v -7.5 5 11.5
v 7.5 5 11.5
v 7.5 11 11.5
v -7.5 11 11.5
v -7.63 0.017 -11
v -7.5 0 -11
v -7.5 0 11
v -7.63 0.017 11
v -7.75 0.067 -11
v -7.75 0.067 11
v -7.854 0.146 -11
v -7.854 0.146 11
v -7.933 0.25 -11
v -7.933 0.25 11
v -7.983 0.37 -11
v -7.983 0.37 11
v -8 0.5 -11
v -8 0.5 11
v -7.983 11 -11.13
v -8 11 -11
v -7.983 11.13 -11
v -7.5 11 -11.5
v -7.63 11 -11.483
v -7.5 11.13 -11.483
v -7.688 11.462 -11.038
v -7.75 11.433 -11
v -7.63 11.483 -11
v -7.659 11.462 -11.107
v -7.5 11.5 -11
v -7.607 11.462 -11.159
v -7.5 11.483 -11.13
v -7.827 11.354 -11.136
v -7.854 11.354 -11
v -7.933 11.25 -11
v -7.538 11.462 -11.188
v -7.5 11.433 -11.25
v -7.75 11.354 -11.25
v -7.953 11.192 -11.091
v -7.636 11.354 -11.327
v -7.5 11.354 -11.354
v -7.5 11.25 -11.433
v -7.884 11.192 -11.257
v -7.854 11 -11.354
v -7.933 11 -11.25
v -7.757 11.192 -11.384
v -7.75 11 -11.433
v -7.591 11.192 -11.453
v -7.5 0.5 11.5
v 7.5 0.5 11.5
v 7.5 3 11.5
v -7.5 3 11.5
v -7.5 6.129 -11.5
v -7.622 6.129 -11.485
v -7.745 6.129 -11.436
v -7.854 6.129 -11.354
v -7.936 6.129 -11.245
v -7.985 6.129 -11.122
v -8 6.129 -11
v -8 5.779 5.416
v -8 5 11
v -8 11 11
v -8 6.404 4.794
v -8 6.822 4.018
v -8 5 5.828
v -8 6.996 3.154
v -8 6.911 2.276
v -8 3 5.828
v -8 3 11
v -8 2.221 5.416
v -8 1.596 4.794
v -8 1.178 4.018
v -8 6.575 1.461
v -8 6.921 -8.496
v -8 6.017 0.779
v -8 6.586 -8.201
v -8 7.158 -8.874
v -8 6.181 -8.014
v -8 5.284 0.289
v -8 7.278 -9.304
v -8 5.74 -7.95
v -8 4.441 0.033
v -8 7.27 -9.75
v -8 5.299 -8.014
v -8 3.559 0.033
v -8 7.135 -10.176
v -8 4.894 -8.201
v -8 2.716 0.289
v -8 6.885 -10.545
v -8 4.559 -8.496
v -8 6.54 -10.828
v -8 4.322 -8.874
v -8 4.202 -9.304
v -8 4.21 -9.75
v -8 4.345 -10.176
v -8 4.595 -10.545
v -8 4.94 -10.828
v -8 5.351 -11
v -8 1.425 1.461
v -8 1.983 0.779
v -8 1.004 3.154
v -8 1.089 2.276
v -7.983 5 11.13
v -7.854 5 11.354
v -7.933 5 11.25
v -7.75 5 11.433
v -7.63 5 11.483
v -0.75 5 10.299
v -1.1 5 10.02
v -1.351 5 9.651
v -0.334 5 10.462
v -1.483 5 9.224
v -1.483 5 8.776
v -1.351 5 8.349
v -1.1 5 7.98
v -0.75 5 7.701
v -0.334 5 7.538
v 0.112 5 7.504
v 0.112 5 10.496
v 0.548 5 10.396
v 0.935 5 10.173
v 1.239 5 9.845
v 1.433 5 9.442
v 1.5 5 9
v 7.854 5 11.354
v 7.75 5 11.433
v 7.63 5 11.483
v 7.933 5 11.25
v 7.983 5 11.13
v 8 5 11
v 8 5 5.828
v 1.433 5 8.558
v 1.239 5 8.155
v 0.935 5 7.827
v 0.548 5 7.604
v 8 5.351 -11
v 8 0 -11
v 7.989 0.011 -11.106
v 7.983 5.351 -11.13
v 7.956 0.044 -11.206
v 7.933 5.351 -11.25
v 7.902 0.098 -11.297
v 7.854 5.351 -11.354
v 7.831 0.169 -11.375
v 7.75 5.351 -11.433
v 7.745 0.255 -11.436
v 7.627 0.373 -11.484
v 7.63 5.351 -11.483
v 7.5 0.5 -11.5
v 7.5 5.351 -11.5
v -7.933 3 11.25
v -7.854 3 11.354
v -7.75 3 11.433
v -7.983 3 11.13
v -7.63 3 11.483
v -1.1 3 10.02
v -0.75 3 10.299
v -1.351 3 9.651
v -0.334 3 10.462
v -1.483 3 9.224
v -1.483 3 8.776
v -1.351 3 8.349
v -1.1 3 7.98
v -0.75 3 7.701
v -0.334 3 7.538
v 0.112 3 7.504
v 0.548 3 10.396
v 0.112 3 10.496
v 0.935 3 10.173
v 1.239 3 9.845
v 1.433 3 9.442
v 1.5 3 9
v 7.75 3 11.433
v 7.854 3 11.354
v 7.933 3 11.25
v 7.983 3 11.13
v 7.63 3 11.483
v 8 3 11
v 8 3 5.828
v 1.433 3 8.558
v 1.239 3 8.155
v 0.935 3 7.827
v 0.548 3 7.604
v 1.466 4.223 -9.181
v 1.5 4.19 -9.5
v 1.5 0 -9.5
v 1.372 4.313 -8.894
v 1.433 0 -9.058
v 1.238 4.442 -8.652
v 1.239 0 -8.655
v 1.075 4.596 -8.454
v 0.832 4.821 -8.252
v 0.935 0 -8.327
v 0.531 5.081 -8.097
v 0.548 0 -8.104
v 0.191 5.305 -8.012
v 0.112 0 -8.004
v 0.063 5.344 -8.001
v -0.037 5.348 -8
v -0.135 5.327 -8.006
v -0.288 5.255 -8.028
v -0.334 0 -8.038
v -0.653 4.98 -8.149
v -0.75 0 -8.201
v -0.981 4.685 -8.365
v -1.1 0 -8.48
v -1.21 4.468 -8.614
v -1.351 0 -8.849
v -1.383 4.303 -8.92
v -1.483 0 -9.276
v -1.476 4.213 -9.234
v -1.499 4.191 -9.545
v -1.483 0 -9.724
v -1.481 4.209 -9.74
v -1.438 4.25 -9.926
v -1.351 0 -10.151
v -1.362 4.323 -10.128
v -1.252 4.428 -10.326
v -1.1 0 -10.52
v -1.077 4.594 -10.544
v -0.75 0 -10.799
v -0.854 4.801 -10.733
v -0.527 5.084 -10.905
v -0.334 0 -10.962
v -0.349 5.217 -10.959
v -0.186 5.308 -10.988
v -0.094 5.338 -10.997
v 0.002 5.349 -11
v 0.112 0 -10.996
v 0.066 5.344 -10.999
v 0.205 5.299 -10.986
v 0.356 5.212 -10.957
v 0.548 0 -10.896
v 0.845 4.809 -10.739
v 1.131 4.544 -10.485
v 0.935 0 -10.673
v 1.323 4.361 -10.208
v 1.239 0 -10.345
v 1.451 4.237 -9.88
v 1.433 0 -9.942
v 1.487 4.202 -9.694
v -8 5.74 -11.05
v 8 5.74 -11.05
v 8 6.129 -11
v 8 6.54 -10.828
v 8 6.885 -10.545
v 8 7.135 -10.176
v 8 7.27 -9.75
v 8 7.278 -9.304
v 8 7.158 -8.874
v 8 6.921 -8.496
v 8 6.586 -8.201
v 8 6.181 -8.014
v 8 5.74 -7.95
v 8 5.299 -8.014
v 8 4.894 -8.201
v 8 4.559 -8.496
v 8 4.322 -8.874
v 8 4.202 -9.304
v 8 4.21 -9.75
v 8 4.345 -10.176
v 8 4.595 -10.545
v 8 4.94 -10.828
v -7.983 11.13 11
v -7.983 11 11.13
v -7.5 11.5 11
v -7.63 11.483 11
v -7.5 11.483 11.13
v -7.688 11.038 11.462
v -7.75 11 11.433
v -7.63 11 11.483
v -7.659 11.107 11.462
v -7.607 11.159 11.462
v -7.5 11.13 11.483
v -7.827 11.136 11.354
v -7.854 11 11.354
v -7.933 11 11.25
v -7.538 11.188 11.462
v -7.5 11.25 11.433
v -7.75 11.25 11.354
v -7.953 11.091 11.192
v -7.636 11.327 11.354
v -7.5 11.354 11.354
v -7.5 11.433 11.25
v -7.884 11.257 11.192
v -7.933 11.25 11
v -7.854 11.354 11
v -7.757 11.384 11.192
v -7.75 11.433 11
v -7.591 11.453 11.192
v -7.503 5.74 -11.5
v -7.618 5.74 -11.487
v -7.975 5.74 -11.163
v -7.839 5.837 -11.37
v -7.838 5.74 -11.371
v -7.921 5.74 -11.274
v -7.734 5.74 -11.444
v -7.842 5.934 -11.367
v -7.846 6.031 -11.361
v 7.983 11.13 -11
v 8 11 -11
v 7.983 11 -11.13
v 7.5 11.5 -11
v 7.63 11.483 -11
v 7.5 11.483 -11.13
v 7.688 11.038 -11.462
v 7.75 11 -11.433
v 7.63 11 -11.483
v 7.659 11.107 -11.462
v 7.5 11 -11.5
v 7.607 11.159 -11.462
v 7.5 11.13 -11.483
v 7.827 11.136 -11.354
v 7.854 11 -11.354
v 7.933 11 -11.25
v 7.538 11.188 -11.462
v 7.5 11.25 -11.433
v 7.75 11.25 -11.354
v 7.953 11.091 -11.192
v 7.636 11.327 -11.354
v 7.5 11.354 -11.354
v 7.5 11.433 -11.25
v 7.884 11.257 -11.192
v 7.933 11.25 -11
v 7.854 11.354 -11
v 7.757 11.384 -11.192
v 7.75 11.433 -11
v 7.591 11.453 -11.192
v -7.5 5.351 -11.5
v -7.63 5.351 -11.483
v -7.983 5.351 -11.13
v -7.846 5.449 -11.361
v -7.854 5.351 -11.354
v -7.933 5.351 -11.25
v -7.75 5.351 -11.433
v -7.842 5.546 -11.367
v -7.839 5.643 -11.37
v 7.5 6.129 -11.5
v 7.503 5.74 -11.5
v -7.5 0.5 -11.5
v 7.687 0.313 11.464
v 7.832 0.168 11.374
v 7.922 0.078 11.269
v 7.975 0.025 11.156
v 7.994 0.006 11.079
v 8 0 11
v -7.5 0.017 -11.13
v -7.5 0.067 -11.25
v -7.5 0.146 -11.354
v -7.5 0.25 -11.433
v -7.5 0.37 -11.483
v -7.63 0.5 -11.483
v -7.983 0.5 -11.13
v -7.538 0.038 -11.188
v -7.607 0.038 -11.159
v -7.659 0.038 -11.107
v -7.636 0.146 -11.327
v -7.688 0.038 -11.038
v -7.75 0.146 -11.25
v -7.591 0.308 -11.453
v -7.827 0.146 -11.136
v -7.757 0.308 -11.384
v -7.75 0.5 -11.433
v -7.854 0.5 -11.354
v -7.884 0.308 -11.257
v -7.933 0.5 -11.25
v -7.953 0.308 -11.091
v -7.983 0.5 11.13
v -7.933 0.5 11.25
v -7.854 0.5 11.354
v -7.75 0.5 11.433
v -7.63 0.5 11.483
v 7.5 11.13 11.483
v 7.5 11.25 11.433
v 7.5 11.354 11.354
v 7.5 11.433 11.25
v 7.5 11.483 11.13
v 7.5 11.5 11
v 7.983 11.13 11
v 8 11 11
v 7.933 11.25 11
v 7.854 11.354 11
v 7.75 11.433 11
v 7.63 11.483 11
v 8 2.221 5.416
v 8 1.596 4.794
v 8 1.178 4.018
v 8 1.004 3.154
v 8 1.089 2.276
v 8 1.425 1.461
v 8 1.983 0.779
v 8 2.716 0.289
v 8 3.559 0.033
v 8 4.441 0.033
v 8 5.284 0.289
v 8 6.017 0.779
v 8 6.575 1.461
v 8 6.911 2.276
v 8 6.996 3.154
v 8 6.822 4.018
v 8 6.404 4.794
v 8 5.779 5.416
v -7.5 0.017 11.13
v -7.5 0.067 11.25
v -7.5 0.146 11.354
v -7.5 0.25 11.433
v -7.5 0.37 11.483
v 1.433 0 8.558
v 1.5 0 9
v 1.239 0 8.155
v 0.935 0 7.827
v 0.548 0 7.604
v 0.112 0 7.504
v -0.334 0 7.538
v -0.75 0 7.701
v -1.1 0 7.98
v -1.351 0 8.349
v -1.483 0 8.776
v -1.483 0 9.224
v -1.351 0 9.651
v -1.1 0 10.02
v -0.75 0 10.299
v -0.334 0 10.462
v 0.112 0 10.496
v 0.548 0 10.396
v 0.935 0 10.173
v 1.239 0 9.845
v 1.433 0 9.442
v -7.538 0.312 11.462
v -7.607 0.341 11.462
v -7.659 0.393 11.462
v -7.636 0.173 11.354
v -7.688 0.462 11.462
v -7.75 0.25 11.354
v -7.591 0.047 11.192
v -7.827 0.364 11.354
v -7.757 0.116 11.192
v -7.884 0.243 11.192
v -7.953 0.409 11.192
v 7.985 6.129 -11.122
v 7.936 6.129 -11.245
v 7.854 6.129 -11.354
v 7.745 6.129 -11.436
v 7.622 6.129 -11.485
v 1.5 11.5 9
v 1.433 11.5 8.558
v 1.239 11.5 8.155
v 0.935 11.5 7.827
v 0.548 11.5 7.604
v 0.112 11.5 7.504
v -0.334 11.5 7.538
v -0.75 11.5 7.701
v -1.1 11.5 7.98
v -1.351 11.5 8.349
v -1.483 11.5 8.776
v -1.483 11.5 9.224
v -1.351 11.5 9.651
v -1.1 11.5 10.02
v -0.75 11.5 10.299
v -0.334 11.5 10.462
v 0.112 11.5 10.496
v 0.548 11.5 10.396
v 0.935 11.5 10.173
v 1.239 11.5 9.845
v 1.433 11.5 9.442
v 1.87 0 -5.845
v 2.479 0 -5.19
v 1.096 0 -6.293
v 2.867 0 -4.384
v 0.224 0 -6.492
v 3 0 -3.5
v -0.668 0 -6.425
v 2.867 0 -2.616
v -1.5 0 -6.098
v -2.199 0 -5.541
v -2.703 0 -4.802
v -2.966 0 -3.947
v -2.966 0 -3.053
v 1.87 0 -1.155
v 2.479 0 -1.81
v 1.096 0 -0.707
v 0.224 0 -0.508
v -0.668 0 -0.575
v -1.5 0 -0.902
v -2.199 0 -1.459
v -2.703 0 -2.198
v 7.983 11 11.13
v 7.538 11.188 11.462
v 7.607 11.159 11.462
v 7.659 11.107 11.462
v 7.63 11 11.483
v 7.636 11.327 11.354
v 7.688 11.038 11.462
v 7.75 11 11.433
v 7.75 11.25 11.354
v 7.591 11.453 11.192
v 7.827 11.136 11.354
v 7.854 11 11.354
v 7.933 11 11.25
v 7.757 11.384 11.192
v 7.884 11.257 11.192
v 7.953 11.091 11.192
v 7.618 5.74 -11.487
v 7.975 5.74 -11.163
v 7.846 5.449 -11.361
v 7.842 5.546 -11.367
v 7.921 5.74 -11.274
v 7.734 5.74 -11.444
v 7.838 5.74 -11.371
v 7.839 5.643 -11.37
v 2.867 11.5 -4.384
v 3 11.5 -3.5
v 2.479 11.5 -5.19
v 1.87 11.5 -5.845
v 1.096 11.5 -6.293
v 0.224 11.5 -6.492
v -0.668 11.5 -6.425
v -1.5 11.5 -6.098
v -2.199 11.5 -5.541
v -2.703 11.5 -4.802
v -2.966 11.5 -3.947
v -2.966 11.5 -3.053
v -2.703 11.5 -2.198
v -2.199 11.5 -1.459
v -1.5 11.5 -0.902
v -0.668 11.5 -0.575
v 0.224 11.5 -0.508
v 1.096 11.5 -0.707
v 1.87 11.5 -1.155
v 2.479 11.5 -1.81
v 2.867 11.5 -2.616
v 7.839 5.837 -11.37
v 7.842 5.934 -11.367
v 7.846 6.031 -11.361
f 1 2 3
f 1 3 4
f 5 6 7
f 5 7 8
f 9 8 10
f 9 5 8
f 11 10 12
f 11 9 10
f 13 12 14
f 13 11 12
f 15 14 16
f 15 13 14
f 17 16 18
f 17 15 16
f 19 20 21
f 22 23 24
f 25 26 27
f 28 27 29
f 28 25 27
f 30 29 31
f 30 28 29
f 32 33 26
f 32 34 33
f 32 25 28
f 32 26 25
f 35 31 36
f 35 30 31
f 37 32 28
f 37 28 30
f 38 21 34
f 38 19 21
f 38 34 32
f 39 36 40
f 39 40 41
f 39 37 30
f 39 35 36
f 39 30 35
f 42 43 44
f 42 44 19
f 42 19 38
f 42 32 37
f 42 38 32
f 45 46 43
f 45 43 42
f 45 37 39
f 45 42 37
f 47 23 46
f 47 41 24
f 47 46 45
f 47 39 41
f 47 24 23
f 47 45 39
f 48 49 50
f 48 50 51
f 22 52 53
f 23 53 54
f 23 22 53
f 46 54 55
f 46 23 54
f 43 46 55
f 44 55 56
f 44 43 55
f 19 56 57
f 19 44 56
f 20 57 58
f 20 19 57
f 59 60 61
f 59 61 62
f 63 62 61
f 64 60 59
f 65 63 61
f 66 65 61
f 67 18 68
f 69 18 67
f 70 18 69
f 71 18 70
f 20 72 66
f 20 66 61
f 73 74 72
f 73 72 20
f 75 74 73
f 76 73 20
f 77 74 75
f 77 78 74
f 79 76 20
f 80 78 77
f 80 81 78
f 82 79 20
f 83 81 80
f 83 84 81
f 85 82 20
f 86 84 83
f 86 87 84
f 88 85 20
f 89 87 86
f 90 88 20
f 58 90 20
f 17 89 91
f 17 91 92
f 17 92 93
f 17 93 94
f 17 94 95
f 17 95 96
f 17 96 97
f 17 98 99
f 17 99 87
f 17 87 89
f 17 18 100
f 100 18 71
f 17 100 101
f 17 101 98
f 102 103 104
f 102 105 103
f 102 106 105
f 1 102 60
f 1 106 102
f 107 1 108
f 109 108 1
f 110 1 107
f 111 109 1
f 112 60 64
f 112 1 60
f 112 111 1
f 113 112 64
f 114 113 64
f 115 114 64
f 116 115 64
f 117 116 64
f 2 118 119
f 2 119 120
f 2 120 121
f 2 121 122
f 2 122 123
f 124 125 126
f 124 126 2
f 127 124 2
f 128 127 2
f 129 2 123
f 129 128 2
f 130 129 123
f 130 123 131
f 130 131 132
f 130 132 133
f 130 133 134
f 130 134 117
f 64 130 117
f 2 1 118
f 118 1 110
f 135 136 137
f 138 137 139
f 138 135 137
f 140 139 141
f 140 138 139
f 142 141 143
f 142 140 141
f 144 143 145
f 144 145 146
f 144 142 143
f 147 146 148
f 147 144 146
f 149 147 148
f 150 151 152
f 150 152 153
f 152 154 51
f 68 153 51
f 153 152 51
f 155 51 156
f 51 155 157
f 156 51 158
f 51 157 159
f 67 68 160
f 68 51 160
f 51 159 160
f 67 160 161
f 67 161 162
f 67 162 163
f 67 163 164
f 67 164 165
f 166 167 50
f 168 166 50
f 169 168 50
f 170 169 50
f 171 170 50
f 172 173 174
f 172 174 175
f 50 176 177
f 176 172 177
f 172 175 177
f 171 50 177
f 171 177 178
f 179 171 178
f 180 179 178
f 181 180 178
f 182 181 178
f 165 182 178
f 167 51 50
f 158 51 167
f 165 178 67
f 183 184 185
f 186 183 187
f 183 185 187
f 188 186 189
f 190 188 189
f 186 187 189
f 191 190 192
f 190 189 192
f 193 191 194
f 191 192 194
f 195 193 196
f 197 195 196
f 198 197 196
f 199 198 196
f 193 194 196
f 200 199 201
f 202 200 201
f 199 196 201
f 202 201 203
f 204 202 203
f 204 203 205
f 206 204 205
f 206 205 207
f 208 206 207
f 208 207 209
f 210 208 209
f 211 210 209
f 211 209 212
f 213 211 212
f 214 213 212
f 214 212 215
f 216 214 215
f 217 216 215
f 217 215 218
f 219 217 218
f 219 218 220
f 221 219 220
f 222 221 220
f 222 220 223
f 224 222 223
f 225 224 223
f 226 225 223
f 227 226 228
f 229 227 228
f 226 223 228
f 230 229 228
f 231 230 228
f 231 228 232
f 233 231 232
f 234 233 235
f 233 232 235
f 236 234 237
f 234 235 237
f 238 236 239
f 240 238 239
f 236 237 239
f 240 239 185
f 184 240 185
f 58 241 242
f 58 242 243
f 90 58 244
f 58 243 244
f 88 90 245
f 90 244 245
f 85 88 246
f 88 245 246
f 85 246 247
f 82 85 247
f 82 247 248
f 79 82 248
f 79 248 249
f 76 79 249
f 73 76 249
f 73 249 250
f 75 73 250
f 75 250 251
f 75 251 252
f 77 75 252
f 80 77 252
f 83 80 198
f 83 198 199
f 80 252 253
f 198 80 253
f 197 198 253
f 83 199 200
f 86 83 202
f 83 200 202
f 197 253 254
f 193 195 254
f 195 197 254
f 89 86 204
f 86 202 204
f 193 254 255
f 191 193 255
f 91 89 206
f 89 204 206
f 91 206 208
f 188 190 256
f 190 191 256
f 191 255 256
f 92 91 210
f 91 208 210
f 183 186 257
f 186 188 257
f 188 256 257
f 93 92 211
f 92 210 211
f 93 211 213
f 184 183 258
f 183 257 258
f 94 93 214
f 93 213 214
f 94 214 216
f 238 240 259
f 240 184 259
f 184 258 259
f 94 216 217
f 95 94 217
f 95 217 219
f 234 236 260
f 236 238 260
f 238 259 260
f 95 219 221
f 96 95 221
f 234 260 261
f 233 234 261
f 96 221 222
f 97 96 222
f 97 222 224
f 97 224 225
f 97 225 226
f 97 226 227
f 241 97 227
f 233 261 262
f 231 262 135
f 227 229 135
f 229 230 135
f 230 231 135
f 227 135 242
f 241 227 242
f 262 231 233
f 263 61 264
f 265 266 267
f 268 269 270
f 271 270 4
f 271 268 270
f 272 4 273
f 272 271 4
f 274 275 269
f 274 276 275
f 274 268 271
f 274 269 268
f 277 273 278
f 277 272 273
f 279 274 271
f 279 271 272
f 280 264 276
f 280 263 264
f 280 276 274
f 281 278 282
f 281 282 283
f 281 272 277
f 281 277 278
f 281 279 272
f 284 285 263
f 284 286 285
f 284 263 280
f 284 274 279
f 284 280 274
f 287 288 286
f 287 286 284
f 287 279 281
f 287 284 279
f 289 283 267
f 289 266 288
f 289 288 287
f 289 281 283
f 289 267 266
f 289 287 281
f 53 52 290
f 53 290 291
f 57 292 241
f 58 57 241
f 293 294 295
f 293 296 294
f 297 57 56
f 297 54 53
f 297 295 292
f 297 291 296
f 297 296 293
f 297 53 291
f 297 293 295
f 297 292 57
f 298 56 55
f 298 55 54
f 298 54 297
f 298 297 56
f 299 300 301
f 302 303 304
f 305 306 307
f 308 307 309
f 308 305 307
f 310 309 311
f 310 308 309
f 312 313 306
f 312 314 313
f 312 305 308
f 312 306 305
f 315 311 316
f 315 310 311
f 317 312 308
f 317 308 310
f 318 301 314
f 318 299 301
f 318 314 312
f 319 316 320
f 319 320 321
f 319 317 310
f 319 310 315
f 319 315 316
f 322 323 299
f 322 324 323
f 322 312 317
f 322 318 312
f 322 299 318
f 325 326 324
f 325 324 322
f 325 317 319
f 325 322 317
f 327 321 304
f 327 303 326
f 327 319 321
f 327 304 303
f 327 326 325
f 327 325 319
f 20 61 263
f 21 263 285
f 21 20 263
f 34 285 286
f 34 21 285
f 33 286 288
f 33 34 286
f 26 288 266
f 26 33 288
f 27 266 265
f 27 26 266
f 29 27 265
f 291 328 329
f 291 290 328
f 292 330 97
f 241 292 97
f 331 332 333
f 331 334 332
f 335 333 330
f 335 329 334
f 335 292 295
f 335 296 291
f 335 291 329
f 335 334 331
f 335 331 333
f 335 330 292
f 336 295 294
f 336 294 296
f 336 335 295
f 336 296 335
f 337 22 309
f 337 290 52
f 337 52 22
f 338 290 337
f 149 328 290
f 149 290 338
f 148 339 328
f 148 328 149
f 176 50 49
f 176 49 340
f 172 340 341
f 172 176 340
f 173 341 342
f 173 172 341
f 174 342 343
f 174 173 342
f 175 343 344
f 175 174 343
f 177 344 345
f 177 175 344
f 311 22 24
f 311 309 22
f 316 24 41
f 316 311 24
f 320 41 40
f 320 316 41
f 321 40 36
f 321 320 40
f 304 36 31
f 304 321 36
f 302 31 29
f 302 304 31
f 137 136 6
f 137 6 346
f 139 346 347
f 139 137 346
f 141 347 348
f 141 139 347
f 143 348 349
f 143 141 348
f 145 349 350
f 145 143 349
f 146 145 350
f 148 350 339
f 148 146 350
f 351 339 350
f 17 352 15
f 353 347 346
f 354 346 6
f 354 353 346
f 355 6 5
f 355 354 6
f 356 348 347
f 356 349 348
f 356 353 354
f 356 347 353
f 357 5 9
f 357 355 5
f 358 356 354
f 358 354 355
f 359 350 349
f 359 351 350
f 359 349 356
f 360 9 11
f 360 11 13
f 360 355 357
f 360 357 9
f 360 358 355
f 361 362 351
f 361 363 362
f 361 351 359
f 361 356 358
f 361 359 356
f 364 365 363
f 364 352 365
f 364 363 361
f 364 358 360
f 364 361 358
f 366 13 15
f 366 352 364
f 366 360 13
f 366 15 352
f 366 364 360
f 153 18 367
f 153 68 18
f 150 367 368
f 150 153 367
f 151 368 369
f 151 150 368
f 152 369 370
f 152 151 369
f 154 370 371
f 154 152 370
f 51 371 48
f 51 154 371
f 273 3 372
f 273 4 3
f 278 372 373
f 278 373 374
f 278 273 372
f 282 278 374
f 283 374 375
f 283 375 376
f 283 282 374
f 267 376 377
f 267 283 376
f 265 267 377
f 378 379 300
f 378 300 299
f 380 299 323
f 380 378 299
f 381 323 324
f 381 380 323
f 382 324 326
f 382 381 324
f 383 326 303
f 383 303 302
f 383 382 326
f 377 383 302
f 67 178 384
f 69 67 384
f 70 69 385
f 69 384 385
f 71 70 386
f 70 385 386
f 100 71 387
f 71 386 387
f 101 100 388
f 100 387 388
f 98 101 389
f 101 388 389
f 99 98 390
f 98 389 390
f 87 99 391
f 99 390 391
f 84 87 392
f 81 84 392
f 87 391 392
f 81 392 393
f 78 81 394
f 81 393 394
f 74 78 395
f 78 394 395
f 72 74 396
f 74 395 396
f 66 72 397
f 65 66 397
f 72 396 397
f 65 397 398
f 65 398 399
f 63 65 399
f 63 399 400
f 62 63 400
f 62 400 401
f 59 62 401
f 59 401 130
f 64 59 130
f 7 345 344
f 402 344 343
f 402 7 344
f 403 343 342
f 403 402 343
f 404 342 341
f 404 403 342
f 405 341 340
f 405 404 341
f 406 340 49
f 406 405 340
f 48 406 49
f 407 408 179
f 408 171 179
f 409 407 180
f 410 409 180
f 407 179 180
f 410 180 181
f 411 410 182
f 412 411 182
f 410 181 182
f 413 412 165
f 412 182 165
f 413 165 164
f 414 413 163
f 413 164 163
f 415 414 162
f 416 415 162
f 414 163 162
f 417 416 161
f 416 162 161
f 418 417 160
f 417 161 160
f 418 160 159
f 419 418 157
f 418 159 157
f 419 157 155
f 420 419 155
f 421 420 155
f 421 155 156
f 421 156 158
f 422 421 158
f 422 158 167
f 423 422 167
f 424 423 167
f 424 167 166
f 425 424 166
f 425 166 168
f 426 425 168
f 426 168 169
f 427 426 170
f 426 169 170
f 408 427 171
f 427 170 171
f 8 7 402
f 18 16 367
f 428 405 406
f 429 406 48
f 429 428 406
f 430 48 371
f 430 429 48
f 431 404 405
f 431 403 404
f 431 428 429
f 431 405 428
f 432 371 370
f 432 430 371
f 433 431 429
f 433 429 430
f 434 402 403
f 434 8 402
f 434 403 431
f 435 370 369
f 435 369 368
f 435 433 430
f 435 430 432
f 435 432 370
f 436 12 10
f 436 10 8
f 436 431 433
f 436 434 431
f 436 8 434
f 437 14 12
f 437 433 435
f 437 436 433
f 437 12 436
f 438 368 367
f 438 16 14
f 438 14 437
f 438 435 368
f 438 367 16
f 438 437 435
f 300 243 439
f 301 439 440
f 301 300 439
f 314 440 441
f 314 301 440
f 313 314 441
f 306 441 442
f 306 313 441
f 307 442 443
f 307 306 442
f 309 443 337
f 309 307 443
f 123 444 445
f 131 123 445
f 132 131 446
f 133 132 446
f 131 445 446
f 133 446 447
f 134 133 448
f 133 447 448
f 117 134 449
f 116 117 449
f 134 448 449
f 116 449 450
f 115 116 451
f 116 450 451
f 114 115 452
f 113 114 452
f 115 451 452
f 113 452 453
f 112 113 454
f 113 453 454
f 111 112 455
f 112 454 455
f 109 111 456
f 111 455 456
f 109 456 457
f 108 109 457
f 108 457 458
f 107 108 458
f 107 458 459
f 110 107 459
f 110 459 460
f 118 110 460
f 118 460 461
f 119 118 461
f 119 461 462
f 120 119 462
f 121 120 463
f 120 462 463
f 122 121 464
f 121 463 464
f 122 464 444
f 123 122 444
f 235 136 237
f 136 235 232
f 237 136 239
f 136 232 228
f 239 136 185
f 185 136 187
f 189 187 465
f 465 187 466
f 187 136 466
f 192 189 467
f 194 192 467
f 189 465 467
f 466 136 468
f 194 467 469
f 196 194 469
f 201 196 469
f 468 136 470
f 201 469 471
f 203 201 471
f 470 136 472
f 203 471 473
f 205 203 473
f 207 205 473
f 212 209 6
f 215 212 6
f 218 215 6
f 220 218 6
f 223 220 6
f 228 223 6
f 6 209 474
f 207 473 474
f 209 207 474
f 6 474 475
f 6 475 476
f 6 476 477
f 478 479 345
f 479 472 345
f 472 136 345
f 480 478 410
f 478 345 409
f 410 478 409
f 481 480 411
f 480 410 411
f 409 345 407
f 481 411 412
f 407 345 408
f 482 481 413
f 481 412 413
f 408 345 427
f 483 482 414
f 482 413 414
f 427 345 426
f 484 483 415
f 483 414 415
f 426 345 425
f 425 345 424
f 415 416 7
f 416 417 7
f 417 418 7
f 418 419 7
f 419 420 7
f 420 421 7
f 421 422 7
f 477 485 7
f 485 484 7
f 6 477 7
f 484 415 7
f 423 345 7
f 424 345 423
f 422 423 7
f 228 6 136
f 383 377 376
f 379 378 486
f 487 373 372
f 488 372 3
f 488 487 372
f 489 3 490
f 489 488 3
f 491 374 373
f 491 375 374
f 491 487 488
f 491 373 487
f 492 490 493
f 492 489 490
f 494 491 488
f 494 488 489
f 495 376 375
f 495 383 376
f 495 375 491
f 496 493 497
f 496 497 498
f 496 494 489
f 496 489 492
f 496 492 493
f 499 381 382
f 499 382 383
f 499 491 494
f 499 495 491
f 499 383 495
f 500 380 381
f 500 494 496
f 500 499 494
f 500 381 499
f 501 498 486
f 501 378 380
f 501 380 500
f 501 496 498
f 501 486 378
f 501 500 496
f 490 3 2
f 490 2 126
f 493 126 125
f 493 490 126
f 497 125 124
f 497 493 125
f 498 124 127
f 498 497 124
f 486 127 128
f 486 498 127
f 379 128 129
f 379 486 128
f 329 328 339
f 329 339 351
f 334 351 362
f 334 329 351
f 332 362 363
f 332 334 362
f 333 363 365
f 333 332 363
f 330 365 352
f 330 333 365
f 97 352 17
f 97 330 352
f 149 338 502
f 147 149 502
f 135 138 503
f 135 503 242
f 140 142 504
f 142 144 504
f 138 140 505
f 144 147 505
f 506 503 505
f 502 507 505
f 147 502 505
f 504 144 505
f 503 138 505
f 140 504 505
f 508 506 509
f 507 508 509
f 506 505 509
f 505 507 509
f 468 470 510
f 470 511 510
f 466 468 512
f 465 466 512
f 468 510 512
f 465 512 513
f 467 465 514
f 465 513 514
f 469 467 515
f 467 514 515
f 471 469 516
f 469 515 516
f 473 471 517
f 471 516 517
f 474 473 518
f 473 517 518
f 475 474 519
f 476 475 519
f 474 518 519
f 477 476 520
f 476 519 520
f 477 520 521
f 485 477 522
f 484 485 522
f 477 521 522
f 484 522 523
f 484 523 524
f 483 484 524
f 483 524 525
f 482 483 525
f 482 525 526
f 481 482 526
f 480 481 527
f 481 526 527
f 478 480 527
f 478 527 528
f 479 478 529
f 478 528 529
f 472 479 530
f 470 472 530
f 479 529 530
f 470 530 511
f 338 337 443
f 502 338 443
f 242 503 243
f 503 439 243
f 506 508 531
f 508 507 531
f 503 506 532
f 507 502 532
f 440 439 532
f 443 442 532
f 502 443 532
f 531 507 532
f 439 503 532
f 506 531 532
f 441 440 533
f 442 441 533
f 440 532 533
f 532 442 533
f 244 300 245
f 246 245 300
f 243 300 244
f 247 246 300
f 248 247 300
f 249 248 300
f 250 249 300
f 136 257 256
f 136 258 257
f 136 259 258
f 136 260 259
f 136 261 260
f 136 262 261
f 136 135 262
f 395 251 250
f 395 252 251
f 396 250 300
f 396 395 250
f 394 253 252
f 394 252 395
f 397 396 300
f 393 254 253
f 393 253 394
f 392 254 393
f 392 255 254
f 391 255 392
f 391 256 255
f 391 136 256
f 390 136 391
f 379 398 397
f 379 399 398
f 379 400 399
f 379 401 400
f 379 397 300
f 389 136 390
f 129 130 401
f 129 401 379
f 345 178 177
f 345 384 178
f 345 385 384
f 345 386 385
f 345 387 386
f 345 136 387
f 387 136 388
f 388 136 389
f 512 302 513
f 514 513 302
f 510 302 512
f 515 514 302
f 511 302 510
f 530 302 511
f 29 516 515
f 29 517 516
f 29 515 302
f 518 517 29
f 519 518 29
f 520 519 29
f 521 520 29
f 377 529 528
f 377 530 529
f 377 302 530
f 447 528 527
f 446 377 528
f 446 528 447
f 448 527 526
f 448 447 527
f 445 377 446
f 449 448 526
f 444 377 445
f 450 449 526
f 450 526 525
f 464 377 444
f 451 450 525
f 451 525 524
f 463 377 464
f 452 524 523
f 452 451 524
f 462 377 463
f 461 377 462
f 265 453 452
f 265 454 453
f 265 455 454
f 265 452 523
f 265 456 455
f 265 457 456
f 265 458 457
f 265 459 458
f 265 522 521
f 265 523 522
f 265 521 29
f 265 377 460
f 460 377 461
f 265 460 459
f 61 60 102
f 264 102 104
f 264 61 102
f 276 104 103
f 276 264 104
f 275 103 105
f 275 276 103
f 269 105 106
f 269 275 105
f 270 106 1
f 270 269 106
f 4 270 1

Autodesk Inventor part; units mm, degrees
ref_plane "YZ Plane" through (0, 0, 0) normal (1, 0, 0) x (0, 1, 0)
ref_plane "XZ Plane" through (0, 0, 0) normal (0, 1, 0) x (-1, 0, 0)
ref_plane "XY Plane" through (0, 0, 0) normal (0, 0, 1) x (1, 0, 0)
sketch "Sketch1" plane through (0, 0, 0) normal (0, 1, 0) x (-1, 0, 0)
  line L0 (-8, 11.5) -> (8, 11.5)
  line L1 (8, 11.5) -> (8, -11.5)
  line L2 (8, -11.5) -> (-8, -11.5)
  line L3 (-8, -11.5) -> (-8, 11.5)
  line L4 (-8, 11.5) -> (8, -11.5) construction
  line L5 (8, 11.5) -> (-8, -11.5) construction
  point P0 (0, 0)
  dimension "d0" = 16
  dimension "d1" = 23
extrude "Extrusion1" add sketch "Sketch1" along normal blind 11.5
sketch "Sketch2" plane through (8, 0, 11.5) normal (1, 0, 0) x (0, 0, -1)
  arc A0 (5.6716, 3) -> (5.6716, 5) centre (8.5, 4) ccw
  line L0 (23, 0) -> (23, 11.5)
  line L1 (23, 0) -> (0, 0)
  line L2 (0, 5) -> (5.6716, 5)
  line L3 (0, 5) -> (0, 3)
  line L4 (0, 0) -> (0, 11.5)
  line L5 (0, 3) -> (5.6716, 3)
  line L6 (8.5, 4) -> (0, 4) construction
  circle A1 centre (21, 5.74) radius 1.55
  point P0 (11.5, 0)
  dimension "d4" = 14.5
  dimension "d5" = 6
  dimension "d6" = 4
  dimension "d7" = 8.5
  dimension "d8" = 2
  dimension "d9" = 3.1
  dimension "d10" = 2
  dimension "d11" = 5.74
extrude "Extrusion2" cut sketch "Sketch2" against normal through all
sketch "Sketch3" plane through (0, 11.5, 0) normal (0, 1, 0) x (1, 0, 0)
  line L0 (8, -11.5) -> (-8, -11.5) construction
  line L1 (0, -11.5) -> (0, 11.545) construction
  circle A0 centre (0, 3.5) radius 3
  circle A1 centre (0, -9) radius 1.5
  line L2 (8, 11.5) -> (-8, 11.5)
  point P0 (0, 0)
  dimension "d14" = 8
  dimension "d15" = 6
  dimension "d17" = 20.5
  dimension "d18" = 3
extrude "Extrusion3" cut sketch "Sketch3" against normal through all
sketch "Sketch4" plane through (0, 0, 0) normal (0, -1, 0) x (1, 0, 0)
  line L0 (0, 0) -> (0, -11.4648) construction
  circle A0 centre (0, -9.5) radius 1.5
  line L1 (-8, -11.5) -> (8, -11.5)
  dimension "d21" = 3
  dimension "d22" = 2
extrude "Extrusion4" cut sketch "Sketch4" against normal up to surface
fillet "Fillet1" radius 0.5 13 edges at (8, 11.5, 0) (8, 5.75, -11.5) (-8, 5.75, -11.5) (0, 11.5, -11.5) (0, 0, -11.5) (-8, 0, 0) (-8, 11.5, 0) (8, 8.25, 11.5) (8, 1.5, 11.5) (-8, 1.5, 11.5) (-8, 8.25, 11.5) (0, 11.5, 11.5) (0, 0, 11.5)
thread "Thread1"
thread "Thread2"
thread "Thread3"
thread "Thread4"
properties part number "E3Dv6_Heater_Block"
